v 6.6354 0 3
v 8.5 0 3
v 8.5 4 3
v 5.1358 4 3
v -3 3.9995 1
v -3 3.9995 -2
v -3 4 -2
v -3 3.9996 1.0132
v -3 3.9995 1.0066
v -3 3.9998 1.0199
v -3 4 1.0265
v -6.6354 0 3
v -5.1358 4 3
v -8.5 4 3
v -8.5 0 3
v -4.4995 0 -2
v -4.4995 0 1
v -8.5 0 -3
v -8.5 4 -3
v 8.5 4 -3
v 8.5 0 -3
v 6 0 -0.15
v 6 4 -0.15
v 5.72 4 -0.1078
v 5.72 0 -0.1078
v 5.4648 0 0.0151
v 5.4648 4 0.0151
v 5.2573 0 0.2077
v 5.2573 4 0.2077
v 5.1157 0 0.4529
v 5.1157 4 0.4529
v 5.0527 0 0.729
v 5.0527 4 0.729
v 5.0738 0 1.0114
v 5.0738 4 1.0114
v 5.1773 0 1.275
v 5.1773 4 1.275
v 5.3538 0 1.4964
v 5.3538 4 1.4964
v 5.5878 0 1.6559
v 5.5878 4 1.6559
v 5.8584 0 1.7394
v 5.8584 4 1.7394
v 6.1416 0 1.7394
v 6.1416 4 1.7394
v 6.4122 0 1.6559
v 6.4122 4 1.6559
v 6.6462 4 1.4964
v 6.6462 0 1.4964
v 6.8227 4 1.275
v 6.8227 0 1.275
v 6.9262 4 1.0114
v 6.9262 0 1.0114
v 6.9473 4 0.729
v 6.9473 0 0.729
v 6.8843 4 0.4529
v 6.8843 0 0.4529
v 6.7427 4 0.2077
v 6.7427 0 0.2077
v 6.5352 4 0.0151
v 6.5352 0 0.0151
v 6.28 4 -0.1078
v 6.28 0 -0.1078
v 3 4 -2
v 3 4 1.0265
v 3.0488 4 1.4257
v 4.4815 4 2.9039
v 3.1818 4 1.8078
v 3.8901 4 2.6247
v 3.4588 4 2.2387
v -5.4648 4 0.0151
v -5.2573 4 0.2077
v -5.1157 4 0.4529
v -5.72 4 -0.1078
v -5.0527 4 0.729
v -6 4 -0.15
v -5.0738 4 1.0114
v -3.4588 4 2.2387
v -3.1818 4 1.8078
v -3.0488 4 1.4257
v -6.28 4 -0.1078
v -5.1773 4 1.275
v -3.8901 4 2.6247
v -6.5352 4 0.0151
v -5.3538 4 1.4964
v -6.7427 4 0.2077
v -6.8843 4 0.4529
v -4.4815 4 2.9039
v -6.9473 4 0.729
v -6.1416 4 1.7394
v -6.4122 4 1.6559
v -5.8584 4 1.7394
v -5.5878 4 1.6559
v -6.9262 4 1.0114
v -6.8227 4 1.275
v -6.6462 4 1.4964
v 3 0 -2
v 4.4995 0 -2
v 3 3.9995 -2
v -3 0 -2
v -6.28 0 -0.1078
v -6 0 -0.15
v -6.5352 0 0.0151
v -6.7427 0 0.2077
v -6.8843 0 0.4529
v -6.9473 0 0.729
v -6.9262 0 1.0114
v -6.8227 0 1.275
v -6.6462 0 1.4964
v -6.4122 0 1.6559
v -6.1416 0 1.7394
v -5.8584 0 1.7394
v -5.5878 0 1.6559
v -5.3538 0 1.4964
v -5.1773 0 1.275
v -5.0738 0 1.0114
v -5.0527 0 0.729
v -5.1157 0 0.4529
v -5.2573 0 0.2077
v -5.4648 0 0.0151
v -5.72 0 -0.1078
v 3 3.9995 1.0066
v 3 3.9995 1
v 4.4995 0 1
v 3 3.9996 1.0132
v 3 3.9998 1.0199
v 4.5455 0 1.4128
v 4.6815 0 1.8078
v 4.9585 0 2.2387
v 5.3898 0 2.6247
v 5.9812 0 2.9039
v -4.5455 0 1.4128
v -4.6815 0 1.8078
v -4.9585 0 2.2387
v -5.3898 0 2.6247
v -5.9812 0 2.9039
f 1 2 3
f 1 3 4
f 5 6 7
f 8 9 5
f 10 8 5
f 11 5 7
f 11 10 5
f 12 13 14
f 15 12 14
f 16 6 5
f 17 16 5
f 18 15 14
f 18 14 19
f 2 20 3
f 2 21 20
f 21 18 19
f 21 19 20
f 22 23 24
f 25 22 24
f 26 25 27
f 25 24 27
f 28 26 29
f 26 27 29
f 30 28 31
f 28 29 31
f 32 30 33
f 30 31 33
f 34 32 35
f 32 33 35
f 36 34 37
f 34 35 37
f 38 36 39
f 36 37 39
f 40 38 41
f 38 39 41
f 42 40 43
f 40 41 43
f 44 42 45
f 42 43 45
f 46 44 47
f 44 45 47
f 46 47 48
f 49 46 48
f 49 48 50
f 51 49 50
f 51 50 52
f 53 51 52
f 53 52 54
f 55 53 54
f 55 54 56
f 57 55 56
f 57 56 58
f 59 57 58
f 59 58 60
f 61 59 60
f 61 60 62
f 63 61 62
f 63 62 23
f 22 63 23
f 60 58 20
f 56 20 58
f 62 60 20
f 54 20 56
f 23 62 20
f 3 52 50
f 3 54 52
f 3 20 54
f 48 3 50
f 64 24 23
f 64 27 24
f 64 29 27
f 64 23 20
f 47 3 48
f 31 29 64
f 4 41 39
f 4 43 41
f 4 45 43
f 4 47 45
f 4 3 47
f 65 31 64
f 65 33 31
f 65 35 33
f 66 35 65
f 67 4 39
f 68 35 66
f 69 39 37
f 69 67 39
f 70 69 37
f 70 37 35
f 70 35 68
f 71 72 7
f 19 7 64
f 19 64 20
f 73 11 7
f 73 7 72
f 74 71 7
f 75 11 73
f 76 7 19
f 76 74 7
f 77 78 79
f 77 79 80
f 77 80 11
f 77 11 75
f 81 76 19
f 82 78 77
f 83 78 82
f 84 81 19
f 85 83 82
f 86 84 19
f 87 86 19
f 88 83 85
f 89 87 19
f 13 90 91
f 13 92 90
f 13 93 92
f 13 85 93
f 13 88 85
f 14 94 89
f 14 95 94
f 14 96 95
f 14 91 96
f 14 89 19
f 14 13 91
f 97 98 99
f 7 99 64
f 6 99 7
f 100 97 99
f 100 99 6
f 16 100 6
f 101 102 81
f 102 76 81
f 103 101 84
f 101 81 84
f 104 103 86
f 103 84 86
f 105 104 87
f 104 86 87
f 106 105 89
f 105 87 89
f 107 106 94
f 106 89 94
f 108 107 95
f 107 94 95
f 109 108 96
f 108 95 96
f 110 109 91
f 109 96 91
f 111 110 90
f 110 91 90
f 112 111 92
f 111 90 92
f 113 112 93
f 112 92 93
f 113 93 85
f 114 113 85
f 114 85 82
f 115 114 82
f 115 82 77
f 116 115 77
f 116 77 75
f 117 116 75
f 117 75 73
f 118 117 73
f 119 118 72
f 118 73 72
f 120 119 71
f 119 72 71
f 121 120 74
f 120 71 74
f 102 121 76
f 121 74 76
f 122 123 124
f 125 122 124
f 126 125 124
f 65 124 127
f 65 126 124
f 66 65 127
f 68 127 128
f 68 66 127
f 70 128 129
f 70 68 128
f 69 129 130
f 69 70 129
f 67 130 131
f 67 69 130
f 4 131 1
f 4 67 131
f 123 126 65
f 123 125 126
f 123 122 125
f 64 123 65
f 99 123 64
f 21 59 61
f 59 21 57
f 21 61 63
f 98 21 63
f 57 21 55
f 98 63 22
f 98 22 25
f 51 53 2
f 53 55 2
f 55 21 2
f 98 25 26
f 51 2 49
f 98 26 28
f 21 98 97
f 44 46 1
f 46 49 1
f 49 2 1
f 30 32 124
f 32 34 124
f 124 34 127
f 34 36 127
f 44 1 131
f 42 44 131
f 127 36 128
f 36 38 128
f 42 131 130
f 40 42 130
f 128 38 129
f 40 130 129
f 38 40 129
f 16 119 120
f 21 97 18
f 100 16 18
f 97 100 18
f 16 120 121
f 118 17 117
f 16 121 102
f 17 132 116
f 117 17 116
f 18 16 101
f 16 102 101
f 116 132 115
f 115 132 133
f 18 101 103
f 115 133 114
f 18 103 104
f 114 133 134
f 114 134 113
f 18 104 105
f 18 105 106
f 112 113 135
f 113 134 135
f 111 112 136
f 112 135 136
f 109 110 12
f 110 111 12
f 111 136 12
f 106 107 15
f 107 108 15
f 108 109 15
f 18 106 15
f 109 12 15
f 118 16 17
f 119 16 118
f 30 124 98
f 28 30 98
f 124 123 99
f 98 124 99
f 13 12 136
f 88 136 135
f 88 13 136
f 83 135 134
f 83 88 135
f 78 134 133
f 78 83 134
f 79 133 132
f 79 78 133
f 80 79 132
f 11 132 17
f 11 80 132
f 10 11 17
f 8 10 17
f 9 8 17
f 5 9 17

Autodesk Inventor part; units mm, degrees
ref_plane "YZ Plane" through (0, 0, 0) normal (1, 0, 0) x (0, 1, 0)
ref_plane "XZ Plane" through (0, 0, 0) normal (0, 1, 0) x (-1, 0, 0)
ref_plane "XY Plane" through (0, 0, 0) normal (0, 0, 1) x (1, 0, 0)
sketch "Skizze1" plane through (0, 0, 0) normal (0, 1, 0) x (-1, 0, 0)
  line L0 (8.5, -3) -> (-8.5, -3)
  line L1 (-8.5, -3) -> (-8.5, 3)
  line L2 (-8.5, 3) -> (8.5, 3)
  line L3 (8.5, 3) -> (8.5, -3)
  line L4 (8.5, -3) -> (-8.5, 3) construction
  line L5 (-8.5, -3) -> (8.5, 3) construction
  point P0 (0, 0)
  dimension "d0" = 17
  dimension "d1" = 6
extrude "Extrusion1" add sketch "Skizze1" along normal blind 4
sketch "Skizze2" plane through (0, 0, 0) normal (0, -1, 0) x (1, 0, 0)
  line L0 (-11.9, 0) -> (11.9, 0) projected
  line L1 (0, 4.2) -> (0, -4.2) projected
  point P0 (0, 0)
  point P1 (-6, 0.8)
  point P2 (6, 0.8)
  dimension "d5" = 0.8
  dimension "d6" = 6
hole "Bohrung1" at (-6, 0, 0.8) at (6, 0, 0.8) direction (0, 1, 0) diameter 1.9 end through all
sketch "Skizze5" plane through (0, 0, 0) normal (0, -1, 0) x (1, 0, 0)
  line L0 (8.5, -3) -> (-8.5, -3) projected
  line L1 (8.5, 3) -> (8.5, -3) projected
  line L2 (-8.5, -3) -> (8.5, -3)
  line L3 (8.5, -3) -> (8.5, -2)
  line L4 (8.5, -2) -> (-8.5, -2)
  line L5 (-8.5, -2) -> (-8.5, -3)
  point P0 (0, 0)
  dimension "d29" = 1
extrude "Extrusion4" [suppressed]
sketch "Skizze6" plane through (0, 0, 0) normal (0, -1, 0) x (1, 0, 0)
  line L0 (8.5, -3) -> (8.5, 3) projected
  line L1 (8.5, 3) -> (-8.5, 3) projected
  line L2 (-8.5, 3) -> (-8.5, -3) projected
  circle A0 centre (-6, 0.8) radius 0.95 projected
  circle A1 centre (6, 0.8) radius 0.95 projected
  line L3 (8.5, 3) -> (-8.5, 3) projected
  line L4 (-3, 3) -> (3, 3)
  line L5 (3, 3) -> (3, -2)
  line L6 (3, -2) -> (-3, -2)
  line L7 (-3, -2) -> (-3, 3)
  line L8 (0, 4.2) -> (0, -4.2) projected
  line L9 (-8.5, -3) -> (8.5, -3) projected
  point P0 (0, 0)
  point P1 (0, 3)
  dimension "d32" = 6
extrude "Extrusion5" cut sketch "Skizze6" against normal through all contours L5 L6 L8 L1 | L6 L7 L1 L8
sketch "Skizze7" plane through (-8.5, -2, -2) normal (0, 0, 1) x (1, 0, 0)
  line L0 (0, 0) -> (1, 0)
  line L1 (1, 0) -> (1, 2)
  line L2 (1, 2) -> (0, 2)
  line L3 (0, 2) -> (0, 0)
  line L4 (17, 0) -> (0, 0) projected
  line L5 (11.5, 2) -> (17, 2) projected
  line L6 (17, 0) -> (16, 0)
  line L7 (16, 0) -> (16, 2)
  line L8 (16, 2) -> (17, 2)
  line L9 (17, 2) -> (17, 0)
  point P0 (8.5, 2)
  dimension "d35" = 1
  dimension "d36" = 1
extrude "Extrusion6" [suppressed]
chamfer "Fase4" [suppressed]
chamfer "Fase6" distance 1.5 distance2 4 1 edges at (-3, 0, 0.5) measured on face at (1, 0, -2.6667)
chamfer "Fase7" distance 1.5 distance2 4 1 edges at (3, 0, 0.5) measured on face at (-1, 0, -2.6667)
fillet "Rundung3" radius 2 4 edges at (-3.7498, 1.9998, 3) (-3, 3.9998, 3) (3.7497, 1.9997, 3) (3, 3.9997, 3)
sketch "Skizze8" plane through (0, 0, 0) normal (0, -1, 0) x (1, 0, 0)
  line L0 (-3, 3) -> (-7.5, 3) projected
  line L1 (-7.5, 3) -> (-7.5, -2) projected
  line L2 (-7.5, -2) -> (-3, -2) projected
  line L3 (-3, -2) -> (-3, 3) projected
  circle A0 centre (-6, 1) radius 0.95 projected
  line L4 (3, 3) -> (3, -2) projected
  line L5 (3, -2) -> (7.5, -2) projected
  line L6 (7.5, -2) -> (7.5, 3) projected
  line L7 (7.5, 3) -> (3, 3) projected
  circle A1 centre (6, 1) radius 0.95 projected
  line L8 (-7.5, 3) -> (-7.5, -2) projected
  line L9 (-7.5, -2) -> (-3, -2) projected
  line L10 (-3, -2) -> (-3, 3) projected
  line L11 (-3, 3) -> (-7.5, 3) projected
  line L12 (7.5, -2) -> (7.5, 3) projected
  line L13 (3, 3) -> (3, -2) projected
  line L14 (3, -2) -> (7.5, -2) projected
  line L15 (7.5, 3) -> (3, 3) projected
equation "\"d5\" = d4"
equation "\"d4\" = 0.8"
properties part number "LED Schirm"
